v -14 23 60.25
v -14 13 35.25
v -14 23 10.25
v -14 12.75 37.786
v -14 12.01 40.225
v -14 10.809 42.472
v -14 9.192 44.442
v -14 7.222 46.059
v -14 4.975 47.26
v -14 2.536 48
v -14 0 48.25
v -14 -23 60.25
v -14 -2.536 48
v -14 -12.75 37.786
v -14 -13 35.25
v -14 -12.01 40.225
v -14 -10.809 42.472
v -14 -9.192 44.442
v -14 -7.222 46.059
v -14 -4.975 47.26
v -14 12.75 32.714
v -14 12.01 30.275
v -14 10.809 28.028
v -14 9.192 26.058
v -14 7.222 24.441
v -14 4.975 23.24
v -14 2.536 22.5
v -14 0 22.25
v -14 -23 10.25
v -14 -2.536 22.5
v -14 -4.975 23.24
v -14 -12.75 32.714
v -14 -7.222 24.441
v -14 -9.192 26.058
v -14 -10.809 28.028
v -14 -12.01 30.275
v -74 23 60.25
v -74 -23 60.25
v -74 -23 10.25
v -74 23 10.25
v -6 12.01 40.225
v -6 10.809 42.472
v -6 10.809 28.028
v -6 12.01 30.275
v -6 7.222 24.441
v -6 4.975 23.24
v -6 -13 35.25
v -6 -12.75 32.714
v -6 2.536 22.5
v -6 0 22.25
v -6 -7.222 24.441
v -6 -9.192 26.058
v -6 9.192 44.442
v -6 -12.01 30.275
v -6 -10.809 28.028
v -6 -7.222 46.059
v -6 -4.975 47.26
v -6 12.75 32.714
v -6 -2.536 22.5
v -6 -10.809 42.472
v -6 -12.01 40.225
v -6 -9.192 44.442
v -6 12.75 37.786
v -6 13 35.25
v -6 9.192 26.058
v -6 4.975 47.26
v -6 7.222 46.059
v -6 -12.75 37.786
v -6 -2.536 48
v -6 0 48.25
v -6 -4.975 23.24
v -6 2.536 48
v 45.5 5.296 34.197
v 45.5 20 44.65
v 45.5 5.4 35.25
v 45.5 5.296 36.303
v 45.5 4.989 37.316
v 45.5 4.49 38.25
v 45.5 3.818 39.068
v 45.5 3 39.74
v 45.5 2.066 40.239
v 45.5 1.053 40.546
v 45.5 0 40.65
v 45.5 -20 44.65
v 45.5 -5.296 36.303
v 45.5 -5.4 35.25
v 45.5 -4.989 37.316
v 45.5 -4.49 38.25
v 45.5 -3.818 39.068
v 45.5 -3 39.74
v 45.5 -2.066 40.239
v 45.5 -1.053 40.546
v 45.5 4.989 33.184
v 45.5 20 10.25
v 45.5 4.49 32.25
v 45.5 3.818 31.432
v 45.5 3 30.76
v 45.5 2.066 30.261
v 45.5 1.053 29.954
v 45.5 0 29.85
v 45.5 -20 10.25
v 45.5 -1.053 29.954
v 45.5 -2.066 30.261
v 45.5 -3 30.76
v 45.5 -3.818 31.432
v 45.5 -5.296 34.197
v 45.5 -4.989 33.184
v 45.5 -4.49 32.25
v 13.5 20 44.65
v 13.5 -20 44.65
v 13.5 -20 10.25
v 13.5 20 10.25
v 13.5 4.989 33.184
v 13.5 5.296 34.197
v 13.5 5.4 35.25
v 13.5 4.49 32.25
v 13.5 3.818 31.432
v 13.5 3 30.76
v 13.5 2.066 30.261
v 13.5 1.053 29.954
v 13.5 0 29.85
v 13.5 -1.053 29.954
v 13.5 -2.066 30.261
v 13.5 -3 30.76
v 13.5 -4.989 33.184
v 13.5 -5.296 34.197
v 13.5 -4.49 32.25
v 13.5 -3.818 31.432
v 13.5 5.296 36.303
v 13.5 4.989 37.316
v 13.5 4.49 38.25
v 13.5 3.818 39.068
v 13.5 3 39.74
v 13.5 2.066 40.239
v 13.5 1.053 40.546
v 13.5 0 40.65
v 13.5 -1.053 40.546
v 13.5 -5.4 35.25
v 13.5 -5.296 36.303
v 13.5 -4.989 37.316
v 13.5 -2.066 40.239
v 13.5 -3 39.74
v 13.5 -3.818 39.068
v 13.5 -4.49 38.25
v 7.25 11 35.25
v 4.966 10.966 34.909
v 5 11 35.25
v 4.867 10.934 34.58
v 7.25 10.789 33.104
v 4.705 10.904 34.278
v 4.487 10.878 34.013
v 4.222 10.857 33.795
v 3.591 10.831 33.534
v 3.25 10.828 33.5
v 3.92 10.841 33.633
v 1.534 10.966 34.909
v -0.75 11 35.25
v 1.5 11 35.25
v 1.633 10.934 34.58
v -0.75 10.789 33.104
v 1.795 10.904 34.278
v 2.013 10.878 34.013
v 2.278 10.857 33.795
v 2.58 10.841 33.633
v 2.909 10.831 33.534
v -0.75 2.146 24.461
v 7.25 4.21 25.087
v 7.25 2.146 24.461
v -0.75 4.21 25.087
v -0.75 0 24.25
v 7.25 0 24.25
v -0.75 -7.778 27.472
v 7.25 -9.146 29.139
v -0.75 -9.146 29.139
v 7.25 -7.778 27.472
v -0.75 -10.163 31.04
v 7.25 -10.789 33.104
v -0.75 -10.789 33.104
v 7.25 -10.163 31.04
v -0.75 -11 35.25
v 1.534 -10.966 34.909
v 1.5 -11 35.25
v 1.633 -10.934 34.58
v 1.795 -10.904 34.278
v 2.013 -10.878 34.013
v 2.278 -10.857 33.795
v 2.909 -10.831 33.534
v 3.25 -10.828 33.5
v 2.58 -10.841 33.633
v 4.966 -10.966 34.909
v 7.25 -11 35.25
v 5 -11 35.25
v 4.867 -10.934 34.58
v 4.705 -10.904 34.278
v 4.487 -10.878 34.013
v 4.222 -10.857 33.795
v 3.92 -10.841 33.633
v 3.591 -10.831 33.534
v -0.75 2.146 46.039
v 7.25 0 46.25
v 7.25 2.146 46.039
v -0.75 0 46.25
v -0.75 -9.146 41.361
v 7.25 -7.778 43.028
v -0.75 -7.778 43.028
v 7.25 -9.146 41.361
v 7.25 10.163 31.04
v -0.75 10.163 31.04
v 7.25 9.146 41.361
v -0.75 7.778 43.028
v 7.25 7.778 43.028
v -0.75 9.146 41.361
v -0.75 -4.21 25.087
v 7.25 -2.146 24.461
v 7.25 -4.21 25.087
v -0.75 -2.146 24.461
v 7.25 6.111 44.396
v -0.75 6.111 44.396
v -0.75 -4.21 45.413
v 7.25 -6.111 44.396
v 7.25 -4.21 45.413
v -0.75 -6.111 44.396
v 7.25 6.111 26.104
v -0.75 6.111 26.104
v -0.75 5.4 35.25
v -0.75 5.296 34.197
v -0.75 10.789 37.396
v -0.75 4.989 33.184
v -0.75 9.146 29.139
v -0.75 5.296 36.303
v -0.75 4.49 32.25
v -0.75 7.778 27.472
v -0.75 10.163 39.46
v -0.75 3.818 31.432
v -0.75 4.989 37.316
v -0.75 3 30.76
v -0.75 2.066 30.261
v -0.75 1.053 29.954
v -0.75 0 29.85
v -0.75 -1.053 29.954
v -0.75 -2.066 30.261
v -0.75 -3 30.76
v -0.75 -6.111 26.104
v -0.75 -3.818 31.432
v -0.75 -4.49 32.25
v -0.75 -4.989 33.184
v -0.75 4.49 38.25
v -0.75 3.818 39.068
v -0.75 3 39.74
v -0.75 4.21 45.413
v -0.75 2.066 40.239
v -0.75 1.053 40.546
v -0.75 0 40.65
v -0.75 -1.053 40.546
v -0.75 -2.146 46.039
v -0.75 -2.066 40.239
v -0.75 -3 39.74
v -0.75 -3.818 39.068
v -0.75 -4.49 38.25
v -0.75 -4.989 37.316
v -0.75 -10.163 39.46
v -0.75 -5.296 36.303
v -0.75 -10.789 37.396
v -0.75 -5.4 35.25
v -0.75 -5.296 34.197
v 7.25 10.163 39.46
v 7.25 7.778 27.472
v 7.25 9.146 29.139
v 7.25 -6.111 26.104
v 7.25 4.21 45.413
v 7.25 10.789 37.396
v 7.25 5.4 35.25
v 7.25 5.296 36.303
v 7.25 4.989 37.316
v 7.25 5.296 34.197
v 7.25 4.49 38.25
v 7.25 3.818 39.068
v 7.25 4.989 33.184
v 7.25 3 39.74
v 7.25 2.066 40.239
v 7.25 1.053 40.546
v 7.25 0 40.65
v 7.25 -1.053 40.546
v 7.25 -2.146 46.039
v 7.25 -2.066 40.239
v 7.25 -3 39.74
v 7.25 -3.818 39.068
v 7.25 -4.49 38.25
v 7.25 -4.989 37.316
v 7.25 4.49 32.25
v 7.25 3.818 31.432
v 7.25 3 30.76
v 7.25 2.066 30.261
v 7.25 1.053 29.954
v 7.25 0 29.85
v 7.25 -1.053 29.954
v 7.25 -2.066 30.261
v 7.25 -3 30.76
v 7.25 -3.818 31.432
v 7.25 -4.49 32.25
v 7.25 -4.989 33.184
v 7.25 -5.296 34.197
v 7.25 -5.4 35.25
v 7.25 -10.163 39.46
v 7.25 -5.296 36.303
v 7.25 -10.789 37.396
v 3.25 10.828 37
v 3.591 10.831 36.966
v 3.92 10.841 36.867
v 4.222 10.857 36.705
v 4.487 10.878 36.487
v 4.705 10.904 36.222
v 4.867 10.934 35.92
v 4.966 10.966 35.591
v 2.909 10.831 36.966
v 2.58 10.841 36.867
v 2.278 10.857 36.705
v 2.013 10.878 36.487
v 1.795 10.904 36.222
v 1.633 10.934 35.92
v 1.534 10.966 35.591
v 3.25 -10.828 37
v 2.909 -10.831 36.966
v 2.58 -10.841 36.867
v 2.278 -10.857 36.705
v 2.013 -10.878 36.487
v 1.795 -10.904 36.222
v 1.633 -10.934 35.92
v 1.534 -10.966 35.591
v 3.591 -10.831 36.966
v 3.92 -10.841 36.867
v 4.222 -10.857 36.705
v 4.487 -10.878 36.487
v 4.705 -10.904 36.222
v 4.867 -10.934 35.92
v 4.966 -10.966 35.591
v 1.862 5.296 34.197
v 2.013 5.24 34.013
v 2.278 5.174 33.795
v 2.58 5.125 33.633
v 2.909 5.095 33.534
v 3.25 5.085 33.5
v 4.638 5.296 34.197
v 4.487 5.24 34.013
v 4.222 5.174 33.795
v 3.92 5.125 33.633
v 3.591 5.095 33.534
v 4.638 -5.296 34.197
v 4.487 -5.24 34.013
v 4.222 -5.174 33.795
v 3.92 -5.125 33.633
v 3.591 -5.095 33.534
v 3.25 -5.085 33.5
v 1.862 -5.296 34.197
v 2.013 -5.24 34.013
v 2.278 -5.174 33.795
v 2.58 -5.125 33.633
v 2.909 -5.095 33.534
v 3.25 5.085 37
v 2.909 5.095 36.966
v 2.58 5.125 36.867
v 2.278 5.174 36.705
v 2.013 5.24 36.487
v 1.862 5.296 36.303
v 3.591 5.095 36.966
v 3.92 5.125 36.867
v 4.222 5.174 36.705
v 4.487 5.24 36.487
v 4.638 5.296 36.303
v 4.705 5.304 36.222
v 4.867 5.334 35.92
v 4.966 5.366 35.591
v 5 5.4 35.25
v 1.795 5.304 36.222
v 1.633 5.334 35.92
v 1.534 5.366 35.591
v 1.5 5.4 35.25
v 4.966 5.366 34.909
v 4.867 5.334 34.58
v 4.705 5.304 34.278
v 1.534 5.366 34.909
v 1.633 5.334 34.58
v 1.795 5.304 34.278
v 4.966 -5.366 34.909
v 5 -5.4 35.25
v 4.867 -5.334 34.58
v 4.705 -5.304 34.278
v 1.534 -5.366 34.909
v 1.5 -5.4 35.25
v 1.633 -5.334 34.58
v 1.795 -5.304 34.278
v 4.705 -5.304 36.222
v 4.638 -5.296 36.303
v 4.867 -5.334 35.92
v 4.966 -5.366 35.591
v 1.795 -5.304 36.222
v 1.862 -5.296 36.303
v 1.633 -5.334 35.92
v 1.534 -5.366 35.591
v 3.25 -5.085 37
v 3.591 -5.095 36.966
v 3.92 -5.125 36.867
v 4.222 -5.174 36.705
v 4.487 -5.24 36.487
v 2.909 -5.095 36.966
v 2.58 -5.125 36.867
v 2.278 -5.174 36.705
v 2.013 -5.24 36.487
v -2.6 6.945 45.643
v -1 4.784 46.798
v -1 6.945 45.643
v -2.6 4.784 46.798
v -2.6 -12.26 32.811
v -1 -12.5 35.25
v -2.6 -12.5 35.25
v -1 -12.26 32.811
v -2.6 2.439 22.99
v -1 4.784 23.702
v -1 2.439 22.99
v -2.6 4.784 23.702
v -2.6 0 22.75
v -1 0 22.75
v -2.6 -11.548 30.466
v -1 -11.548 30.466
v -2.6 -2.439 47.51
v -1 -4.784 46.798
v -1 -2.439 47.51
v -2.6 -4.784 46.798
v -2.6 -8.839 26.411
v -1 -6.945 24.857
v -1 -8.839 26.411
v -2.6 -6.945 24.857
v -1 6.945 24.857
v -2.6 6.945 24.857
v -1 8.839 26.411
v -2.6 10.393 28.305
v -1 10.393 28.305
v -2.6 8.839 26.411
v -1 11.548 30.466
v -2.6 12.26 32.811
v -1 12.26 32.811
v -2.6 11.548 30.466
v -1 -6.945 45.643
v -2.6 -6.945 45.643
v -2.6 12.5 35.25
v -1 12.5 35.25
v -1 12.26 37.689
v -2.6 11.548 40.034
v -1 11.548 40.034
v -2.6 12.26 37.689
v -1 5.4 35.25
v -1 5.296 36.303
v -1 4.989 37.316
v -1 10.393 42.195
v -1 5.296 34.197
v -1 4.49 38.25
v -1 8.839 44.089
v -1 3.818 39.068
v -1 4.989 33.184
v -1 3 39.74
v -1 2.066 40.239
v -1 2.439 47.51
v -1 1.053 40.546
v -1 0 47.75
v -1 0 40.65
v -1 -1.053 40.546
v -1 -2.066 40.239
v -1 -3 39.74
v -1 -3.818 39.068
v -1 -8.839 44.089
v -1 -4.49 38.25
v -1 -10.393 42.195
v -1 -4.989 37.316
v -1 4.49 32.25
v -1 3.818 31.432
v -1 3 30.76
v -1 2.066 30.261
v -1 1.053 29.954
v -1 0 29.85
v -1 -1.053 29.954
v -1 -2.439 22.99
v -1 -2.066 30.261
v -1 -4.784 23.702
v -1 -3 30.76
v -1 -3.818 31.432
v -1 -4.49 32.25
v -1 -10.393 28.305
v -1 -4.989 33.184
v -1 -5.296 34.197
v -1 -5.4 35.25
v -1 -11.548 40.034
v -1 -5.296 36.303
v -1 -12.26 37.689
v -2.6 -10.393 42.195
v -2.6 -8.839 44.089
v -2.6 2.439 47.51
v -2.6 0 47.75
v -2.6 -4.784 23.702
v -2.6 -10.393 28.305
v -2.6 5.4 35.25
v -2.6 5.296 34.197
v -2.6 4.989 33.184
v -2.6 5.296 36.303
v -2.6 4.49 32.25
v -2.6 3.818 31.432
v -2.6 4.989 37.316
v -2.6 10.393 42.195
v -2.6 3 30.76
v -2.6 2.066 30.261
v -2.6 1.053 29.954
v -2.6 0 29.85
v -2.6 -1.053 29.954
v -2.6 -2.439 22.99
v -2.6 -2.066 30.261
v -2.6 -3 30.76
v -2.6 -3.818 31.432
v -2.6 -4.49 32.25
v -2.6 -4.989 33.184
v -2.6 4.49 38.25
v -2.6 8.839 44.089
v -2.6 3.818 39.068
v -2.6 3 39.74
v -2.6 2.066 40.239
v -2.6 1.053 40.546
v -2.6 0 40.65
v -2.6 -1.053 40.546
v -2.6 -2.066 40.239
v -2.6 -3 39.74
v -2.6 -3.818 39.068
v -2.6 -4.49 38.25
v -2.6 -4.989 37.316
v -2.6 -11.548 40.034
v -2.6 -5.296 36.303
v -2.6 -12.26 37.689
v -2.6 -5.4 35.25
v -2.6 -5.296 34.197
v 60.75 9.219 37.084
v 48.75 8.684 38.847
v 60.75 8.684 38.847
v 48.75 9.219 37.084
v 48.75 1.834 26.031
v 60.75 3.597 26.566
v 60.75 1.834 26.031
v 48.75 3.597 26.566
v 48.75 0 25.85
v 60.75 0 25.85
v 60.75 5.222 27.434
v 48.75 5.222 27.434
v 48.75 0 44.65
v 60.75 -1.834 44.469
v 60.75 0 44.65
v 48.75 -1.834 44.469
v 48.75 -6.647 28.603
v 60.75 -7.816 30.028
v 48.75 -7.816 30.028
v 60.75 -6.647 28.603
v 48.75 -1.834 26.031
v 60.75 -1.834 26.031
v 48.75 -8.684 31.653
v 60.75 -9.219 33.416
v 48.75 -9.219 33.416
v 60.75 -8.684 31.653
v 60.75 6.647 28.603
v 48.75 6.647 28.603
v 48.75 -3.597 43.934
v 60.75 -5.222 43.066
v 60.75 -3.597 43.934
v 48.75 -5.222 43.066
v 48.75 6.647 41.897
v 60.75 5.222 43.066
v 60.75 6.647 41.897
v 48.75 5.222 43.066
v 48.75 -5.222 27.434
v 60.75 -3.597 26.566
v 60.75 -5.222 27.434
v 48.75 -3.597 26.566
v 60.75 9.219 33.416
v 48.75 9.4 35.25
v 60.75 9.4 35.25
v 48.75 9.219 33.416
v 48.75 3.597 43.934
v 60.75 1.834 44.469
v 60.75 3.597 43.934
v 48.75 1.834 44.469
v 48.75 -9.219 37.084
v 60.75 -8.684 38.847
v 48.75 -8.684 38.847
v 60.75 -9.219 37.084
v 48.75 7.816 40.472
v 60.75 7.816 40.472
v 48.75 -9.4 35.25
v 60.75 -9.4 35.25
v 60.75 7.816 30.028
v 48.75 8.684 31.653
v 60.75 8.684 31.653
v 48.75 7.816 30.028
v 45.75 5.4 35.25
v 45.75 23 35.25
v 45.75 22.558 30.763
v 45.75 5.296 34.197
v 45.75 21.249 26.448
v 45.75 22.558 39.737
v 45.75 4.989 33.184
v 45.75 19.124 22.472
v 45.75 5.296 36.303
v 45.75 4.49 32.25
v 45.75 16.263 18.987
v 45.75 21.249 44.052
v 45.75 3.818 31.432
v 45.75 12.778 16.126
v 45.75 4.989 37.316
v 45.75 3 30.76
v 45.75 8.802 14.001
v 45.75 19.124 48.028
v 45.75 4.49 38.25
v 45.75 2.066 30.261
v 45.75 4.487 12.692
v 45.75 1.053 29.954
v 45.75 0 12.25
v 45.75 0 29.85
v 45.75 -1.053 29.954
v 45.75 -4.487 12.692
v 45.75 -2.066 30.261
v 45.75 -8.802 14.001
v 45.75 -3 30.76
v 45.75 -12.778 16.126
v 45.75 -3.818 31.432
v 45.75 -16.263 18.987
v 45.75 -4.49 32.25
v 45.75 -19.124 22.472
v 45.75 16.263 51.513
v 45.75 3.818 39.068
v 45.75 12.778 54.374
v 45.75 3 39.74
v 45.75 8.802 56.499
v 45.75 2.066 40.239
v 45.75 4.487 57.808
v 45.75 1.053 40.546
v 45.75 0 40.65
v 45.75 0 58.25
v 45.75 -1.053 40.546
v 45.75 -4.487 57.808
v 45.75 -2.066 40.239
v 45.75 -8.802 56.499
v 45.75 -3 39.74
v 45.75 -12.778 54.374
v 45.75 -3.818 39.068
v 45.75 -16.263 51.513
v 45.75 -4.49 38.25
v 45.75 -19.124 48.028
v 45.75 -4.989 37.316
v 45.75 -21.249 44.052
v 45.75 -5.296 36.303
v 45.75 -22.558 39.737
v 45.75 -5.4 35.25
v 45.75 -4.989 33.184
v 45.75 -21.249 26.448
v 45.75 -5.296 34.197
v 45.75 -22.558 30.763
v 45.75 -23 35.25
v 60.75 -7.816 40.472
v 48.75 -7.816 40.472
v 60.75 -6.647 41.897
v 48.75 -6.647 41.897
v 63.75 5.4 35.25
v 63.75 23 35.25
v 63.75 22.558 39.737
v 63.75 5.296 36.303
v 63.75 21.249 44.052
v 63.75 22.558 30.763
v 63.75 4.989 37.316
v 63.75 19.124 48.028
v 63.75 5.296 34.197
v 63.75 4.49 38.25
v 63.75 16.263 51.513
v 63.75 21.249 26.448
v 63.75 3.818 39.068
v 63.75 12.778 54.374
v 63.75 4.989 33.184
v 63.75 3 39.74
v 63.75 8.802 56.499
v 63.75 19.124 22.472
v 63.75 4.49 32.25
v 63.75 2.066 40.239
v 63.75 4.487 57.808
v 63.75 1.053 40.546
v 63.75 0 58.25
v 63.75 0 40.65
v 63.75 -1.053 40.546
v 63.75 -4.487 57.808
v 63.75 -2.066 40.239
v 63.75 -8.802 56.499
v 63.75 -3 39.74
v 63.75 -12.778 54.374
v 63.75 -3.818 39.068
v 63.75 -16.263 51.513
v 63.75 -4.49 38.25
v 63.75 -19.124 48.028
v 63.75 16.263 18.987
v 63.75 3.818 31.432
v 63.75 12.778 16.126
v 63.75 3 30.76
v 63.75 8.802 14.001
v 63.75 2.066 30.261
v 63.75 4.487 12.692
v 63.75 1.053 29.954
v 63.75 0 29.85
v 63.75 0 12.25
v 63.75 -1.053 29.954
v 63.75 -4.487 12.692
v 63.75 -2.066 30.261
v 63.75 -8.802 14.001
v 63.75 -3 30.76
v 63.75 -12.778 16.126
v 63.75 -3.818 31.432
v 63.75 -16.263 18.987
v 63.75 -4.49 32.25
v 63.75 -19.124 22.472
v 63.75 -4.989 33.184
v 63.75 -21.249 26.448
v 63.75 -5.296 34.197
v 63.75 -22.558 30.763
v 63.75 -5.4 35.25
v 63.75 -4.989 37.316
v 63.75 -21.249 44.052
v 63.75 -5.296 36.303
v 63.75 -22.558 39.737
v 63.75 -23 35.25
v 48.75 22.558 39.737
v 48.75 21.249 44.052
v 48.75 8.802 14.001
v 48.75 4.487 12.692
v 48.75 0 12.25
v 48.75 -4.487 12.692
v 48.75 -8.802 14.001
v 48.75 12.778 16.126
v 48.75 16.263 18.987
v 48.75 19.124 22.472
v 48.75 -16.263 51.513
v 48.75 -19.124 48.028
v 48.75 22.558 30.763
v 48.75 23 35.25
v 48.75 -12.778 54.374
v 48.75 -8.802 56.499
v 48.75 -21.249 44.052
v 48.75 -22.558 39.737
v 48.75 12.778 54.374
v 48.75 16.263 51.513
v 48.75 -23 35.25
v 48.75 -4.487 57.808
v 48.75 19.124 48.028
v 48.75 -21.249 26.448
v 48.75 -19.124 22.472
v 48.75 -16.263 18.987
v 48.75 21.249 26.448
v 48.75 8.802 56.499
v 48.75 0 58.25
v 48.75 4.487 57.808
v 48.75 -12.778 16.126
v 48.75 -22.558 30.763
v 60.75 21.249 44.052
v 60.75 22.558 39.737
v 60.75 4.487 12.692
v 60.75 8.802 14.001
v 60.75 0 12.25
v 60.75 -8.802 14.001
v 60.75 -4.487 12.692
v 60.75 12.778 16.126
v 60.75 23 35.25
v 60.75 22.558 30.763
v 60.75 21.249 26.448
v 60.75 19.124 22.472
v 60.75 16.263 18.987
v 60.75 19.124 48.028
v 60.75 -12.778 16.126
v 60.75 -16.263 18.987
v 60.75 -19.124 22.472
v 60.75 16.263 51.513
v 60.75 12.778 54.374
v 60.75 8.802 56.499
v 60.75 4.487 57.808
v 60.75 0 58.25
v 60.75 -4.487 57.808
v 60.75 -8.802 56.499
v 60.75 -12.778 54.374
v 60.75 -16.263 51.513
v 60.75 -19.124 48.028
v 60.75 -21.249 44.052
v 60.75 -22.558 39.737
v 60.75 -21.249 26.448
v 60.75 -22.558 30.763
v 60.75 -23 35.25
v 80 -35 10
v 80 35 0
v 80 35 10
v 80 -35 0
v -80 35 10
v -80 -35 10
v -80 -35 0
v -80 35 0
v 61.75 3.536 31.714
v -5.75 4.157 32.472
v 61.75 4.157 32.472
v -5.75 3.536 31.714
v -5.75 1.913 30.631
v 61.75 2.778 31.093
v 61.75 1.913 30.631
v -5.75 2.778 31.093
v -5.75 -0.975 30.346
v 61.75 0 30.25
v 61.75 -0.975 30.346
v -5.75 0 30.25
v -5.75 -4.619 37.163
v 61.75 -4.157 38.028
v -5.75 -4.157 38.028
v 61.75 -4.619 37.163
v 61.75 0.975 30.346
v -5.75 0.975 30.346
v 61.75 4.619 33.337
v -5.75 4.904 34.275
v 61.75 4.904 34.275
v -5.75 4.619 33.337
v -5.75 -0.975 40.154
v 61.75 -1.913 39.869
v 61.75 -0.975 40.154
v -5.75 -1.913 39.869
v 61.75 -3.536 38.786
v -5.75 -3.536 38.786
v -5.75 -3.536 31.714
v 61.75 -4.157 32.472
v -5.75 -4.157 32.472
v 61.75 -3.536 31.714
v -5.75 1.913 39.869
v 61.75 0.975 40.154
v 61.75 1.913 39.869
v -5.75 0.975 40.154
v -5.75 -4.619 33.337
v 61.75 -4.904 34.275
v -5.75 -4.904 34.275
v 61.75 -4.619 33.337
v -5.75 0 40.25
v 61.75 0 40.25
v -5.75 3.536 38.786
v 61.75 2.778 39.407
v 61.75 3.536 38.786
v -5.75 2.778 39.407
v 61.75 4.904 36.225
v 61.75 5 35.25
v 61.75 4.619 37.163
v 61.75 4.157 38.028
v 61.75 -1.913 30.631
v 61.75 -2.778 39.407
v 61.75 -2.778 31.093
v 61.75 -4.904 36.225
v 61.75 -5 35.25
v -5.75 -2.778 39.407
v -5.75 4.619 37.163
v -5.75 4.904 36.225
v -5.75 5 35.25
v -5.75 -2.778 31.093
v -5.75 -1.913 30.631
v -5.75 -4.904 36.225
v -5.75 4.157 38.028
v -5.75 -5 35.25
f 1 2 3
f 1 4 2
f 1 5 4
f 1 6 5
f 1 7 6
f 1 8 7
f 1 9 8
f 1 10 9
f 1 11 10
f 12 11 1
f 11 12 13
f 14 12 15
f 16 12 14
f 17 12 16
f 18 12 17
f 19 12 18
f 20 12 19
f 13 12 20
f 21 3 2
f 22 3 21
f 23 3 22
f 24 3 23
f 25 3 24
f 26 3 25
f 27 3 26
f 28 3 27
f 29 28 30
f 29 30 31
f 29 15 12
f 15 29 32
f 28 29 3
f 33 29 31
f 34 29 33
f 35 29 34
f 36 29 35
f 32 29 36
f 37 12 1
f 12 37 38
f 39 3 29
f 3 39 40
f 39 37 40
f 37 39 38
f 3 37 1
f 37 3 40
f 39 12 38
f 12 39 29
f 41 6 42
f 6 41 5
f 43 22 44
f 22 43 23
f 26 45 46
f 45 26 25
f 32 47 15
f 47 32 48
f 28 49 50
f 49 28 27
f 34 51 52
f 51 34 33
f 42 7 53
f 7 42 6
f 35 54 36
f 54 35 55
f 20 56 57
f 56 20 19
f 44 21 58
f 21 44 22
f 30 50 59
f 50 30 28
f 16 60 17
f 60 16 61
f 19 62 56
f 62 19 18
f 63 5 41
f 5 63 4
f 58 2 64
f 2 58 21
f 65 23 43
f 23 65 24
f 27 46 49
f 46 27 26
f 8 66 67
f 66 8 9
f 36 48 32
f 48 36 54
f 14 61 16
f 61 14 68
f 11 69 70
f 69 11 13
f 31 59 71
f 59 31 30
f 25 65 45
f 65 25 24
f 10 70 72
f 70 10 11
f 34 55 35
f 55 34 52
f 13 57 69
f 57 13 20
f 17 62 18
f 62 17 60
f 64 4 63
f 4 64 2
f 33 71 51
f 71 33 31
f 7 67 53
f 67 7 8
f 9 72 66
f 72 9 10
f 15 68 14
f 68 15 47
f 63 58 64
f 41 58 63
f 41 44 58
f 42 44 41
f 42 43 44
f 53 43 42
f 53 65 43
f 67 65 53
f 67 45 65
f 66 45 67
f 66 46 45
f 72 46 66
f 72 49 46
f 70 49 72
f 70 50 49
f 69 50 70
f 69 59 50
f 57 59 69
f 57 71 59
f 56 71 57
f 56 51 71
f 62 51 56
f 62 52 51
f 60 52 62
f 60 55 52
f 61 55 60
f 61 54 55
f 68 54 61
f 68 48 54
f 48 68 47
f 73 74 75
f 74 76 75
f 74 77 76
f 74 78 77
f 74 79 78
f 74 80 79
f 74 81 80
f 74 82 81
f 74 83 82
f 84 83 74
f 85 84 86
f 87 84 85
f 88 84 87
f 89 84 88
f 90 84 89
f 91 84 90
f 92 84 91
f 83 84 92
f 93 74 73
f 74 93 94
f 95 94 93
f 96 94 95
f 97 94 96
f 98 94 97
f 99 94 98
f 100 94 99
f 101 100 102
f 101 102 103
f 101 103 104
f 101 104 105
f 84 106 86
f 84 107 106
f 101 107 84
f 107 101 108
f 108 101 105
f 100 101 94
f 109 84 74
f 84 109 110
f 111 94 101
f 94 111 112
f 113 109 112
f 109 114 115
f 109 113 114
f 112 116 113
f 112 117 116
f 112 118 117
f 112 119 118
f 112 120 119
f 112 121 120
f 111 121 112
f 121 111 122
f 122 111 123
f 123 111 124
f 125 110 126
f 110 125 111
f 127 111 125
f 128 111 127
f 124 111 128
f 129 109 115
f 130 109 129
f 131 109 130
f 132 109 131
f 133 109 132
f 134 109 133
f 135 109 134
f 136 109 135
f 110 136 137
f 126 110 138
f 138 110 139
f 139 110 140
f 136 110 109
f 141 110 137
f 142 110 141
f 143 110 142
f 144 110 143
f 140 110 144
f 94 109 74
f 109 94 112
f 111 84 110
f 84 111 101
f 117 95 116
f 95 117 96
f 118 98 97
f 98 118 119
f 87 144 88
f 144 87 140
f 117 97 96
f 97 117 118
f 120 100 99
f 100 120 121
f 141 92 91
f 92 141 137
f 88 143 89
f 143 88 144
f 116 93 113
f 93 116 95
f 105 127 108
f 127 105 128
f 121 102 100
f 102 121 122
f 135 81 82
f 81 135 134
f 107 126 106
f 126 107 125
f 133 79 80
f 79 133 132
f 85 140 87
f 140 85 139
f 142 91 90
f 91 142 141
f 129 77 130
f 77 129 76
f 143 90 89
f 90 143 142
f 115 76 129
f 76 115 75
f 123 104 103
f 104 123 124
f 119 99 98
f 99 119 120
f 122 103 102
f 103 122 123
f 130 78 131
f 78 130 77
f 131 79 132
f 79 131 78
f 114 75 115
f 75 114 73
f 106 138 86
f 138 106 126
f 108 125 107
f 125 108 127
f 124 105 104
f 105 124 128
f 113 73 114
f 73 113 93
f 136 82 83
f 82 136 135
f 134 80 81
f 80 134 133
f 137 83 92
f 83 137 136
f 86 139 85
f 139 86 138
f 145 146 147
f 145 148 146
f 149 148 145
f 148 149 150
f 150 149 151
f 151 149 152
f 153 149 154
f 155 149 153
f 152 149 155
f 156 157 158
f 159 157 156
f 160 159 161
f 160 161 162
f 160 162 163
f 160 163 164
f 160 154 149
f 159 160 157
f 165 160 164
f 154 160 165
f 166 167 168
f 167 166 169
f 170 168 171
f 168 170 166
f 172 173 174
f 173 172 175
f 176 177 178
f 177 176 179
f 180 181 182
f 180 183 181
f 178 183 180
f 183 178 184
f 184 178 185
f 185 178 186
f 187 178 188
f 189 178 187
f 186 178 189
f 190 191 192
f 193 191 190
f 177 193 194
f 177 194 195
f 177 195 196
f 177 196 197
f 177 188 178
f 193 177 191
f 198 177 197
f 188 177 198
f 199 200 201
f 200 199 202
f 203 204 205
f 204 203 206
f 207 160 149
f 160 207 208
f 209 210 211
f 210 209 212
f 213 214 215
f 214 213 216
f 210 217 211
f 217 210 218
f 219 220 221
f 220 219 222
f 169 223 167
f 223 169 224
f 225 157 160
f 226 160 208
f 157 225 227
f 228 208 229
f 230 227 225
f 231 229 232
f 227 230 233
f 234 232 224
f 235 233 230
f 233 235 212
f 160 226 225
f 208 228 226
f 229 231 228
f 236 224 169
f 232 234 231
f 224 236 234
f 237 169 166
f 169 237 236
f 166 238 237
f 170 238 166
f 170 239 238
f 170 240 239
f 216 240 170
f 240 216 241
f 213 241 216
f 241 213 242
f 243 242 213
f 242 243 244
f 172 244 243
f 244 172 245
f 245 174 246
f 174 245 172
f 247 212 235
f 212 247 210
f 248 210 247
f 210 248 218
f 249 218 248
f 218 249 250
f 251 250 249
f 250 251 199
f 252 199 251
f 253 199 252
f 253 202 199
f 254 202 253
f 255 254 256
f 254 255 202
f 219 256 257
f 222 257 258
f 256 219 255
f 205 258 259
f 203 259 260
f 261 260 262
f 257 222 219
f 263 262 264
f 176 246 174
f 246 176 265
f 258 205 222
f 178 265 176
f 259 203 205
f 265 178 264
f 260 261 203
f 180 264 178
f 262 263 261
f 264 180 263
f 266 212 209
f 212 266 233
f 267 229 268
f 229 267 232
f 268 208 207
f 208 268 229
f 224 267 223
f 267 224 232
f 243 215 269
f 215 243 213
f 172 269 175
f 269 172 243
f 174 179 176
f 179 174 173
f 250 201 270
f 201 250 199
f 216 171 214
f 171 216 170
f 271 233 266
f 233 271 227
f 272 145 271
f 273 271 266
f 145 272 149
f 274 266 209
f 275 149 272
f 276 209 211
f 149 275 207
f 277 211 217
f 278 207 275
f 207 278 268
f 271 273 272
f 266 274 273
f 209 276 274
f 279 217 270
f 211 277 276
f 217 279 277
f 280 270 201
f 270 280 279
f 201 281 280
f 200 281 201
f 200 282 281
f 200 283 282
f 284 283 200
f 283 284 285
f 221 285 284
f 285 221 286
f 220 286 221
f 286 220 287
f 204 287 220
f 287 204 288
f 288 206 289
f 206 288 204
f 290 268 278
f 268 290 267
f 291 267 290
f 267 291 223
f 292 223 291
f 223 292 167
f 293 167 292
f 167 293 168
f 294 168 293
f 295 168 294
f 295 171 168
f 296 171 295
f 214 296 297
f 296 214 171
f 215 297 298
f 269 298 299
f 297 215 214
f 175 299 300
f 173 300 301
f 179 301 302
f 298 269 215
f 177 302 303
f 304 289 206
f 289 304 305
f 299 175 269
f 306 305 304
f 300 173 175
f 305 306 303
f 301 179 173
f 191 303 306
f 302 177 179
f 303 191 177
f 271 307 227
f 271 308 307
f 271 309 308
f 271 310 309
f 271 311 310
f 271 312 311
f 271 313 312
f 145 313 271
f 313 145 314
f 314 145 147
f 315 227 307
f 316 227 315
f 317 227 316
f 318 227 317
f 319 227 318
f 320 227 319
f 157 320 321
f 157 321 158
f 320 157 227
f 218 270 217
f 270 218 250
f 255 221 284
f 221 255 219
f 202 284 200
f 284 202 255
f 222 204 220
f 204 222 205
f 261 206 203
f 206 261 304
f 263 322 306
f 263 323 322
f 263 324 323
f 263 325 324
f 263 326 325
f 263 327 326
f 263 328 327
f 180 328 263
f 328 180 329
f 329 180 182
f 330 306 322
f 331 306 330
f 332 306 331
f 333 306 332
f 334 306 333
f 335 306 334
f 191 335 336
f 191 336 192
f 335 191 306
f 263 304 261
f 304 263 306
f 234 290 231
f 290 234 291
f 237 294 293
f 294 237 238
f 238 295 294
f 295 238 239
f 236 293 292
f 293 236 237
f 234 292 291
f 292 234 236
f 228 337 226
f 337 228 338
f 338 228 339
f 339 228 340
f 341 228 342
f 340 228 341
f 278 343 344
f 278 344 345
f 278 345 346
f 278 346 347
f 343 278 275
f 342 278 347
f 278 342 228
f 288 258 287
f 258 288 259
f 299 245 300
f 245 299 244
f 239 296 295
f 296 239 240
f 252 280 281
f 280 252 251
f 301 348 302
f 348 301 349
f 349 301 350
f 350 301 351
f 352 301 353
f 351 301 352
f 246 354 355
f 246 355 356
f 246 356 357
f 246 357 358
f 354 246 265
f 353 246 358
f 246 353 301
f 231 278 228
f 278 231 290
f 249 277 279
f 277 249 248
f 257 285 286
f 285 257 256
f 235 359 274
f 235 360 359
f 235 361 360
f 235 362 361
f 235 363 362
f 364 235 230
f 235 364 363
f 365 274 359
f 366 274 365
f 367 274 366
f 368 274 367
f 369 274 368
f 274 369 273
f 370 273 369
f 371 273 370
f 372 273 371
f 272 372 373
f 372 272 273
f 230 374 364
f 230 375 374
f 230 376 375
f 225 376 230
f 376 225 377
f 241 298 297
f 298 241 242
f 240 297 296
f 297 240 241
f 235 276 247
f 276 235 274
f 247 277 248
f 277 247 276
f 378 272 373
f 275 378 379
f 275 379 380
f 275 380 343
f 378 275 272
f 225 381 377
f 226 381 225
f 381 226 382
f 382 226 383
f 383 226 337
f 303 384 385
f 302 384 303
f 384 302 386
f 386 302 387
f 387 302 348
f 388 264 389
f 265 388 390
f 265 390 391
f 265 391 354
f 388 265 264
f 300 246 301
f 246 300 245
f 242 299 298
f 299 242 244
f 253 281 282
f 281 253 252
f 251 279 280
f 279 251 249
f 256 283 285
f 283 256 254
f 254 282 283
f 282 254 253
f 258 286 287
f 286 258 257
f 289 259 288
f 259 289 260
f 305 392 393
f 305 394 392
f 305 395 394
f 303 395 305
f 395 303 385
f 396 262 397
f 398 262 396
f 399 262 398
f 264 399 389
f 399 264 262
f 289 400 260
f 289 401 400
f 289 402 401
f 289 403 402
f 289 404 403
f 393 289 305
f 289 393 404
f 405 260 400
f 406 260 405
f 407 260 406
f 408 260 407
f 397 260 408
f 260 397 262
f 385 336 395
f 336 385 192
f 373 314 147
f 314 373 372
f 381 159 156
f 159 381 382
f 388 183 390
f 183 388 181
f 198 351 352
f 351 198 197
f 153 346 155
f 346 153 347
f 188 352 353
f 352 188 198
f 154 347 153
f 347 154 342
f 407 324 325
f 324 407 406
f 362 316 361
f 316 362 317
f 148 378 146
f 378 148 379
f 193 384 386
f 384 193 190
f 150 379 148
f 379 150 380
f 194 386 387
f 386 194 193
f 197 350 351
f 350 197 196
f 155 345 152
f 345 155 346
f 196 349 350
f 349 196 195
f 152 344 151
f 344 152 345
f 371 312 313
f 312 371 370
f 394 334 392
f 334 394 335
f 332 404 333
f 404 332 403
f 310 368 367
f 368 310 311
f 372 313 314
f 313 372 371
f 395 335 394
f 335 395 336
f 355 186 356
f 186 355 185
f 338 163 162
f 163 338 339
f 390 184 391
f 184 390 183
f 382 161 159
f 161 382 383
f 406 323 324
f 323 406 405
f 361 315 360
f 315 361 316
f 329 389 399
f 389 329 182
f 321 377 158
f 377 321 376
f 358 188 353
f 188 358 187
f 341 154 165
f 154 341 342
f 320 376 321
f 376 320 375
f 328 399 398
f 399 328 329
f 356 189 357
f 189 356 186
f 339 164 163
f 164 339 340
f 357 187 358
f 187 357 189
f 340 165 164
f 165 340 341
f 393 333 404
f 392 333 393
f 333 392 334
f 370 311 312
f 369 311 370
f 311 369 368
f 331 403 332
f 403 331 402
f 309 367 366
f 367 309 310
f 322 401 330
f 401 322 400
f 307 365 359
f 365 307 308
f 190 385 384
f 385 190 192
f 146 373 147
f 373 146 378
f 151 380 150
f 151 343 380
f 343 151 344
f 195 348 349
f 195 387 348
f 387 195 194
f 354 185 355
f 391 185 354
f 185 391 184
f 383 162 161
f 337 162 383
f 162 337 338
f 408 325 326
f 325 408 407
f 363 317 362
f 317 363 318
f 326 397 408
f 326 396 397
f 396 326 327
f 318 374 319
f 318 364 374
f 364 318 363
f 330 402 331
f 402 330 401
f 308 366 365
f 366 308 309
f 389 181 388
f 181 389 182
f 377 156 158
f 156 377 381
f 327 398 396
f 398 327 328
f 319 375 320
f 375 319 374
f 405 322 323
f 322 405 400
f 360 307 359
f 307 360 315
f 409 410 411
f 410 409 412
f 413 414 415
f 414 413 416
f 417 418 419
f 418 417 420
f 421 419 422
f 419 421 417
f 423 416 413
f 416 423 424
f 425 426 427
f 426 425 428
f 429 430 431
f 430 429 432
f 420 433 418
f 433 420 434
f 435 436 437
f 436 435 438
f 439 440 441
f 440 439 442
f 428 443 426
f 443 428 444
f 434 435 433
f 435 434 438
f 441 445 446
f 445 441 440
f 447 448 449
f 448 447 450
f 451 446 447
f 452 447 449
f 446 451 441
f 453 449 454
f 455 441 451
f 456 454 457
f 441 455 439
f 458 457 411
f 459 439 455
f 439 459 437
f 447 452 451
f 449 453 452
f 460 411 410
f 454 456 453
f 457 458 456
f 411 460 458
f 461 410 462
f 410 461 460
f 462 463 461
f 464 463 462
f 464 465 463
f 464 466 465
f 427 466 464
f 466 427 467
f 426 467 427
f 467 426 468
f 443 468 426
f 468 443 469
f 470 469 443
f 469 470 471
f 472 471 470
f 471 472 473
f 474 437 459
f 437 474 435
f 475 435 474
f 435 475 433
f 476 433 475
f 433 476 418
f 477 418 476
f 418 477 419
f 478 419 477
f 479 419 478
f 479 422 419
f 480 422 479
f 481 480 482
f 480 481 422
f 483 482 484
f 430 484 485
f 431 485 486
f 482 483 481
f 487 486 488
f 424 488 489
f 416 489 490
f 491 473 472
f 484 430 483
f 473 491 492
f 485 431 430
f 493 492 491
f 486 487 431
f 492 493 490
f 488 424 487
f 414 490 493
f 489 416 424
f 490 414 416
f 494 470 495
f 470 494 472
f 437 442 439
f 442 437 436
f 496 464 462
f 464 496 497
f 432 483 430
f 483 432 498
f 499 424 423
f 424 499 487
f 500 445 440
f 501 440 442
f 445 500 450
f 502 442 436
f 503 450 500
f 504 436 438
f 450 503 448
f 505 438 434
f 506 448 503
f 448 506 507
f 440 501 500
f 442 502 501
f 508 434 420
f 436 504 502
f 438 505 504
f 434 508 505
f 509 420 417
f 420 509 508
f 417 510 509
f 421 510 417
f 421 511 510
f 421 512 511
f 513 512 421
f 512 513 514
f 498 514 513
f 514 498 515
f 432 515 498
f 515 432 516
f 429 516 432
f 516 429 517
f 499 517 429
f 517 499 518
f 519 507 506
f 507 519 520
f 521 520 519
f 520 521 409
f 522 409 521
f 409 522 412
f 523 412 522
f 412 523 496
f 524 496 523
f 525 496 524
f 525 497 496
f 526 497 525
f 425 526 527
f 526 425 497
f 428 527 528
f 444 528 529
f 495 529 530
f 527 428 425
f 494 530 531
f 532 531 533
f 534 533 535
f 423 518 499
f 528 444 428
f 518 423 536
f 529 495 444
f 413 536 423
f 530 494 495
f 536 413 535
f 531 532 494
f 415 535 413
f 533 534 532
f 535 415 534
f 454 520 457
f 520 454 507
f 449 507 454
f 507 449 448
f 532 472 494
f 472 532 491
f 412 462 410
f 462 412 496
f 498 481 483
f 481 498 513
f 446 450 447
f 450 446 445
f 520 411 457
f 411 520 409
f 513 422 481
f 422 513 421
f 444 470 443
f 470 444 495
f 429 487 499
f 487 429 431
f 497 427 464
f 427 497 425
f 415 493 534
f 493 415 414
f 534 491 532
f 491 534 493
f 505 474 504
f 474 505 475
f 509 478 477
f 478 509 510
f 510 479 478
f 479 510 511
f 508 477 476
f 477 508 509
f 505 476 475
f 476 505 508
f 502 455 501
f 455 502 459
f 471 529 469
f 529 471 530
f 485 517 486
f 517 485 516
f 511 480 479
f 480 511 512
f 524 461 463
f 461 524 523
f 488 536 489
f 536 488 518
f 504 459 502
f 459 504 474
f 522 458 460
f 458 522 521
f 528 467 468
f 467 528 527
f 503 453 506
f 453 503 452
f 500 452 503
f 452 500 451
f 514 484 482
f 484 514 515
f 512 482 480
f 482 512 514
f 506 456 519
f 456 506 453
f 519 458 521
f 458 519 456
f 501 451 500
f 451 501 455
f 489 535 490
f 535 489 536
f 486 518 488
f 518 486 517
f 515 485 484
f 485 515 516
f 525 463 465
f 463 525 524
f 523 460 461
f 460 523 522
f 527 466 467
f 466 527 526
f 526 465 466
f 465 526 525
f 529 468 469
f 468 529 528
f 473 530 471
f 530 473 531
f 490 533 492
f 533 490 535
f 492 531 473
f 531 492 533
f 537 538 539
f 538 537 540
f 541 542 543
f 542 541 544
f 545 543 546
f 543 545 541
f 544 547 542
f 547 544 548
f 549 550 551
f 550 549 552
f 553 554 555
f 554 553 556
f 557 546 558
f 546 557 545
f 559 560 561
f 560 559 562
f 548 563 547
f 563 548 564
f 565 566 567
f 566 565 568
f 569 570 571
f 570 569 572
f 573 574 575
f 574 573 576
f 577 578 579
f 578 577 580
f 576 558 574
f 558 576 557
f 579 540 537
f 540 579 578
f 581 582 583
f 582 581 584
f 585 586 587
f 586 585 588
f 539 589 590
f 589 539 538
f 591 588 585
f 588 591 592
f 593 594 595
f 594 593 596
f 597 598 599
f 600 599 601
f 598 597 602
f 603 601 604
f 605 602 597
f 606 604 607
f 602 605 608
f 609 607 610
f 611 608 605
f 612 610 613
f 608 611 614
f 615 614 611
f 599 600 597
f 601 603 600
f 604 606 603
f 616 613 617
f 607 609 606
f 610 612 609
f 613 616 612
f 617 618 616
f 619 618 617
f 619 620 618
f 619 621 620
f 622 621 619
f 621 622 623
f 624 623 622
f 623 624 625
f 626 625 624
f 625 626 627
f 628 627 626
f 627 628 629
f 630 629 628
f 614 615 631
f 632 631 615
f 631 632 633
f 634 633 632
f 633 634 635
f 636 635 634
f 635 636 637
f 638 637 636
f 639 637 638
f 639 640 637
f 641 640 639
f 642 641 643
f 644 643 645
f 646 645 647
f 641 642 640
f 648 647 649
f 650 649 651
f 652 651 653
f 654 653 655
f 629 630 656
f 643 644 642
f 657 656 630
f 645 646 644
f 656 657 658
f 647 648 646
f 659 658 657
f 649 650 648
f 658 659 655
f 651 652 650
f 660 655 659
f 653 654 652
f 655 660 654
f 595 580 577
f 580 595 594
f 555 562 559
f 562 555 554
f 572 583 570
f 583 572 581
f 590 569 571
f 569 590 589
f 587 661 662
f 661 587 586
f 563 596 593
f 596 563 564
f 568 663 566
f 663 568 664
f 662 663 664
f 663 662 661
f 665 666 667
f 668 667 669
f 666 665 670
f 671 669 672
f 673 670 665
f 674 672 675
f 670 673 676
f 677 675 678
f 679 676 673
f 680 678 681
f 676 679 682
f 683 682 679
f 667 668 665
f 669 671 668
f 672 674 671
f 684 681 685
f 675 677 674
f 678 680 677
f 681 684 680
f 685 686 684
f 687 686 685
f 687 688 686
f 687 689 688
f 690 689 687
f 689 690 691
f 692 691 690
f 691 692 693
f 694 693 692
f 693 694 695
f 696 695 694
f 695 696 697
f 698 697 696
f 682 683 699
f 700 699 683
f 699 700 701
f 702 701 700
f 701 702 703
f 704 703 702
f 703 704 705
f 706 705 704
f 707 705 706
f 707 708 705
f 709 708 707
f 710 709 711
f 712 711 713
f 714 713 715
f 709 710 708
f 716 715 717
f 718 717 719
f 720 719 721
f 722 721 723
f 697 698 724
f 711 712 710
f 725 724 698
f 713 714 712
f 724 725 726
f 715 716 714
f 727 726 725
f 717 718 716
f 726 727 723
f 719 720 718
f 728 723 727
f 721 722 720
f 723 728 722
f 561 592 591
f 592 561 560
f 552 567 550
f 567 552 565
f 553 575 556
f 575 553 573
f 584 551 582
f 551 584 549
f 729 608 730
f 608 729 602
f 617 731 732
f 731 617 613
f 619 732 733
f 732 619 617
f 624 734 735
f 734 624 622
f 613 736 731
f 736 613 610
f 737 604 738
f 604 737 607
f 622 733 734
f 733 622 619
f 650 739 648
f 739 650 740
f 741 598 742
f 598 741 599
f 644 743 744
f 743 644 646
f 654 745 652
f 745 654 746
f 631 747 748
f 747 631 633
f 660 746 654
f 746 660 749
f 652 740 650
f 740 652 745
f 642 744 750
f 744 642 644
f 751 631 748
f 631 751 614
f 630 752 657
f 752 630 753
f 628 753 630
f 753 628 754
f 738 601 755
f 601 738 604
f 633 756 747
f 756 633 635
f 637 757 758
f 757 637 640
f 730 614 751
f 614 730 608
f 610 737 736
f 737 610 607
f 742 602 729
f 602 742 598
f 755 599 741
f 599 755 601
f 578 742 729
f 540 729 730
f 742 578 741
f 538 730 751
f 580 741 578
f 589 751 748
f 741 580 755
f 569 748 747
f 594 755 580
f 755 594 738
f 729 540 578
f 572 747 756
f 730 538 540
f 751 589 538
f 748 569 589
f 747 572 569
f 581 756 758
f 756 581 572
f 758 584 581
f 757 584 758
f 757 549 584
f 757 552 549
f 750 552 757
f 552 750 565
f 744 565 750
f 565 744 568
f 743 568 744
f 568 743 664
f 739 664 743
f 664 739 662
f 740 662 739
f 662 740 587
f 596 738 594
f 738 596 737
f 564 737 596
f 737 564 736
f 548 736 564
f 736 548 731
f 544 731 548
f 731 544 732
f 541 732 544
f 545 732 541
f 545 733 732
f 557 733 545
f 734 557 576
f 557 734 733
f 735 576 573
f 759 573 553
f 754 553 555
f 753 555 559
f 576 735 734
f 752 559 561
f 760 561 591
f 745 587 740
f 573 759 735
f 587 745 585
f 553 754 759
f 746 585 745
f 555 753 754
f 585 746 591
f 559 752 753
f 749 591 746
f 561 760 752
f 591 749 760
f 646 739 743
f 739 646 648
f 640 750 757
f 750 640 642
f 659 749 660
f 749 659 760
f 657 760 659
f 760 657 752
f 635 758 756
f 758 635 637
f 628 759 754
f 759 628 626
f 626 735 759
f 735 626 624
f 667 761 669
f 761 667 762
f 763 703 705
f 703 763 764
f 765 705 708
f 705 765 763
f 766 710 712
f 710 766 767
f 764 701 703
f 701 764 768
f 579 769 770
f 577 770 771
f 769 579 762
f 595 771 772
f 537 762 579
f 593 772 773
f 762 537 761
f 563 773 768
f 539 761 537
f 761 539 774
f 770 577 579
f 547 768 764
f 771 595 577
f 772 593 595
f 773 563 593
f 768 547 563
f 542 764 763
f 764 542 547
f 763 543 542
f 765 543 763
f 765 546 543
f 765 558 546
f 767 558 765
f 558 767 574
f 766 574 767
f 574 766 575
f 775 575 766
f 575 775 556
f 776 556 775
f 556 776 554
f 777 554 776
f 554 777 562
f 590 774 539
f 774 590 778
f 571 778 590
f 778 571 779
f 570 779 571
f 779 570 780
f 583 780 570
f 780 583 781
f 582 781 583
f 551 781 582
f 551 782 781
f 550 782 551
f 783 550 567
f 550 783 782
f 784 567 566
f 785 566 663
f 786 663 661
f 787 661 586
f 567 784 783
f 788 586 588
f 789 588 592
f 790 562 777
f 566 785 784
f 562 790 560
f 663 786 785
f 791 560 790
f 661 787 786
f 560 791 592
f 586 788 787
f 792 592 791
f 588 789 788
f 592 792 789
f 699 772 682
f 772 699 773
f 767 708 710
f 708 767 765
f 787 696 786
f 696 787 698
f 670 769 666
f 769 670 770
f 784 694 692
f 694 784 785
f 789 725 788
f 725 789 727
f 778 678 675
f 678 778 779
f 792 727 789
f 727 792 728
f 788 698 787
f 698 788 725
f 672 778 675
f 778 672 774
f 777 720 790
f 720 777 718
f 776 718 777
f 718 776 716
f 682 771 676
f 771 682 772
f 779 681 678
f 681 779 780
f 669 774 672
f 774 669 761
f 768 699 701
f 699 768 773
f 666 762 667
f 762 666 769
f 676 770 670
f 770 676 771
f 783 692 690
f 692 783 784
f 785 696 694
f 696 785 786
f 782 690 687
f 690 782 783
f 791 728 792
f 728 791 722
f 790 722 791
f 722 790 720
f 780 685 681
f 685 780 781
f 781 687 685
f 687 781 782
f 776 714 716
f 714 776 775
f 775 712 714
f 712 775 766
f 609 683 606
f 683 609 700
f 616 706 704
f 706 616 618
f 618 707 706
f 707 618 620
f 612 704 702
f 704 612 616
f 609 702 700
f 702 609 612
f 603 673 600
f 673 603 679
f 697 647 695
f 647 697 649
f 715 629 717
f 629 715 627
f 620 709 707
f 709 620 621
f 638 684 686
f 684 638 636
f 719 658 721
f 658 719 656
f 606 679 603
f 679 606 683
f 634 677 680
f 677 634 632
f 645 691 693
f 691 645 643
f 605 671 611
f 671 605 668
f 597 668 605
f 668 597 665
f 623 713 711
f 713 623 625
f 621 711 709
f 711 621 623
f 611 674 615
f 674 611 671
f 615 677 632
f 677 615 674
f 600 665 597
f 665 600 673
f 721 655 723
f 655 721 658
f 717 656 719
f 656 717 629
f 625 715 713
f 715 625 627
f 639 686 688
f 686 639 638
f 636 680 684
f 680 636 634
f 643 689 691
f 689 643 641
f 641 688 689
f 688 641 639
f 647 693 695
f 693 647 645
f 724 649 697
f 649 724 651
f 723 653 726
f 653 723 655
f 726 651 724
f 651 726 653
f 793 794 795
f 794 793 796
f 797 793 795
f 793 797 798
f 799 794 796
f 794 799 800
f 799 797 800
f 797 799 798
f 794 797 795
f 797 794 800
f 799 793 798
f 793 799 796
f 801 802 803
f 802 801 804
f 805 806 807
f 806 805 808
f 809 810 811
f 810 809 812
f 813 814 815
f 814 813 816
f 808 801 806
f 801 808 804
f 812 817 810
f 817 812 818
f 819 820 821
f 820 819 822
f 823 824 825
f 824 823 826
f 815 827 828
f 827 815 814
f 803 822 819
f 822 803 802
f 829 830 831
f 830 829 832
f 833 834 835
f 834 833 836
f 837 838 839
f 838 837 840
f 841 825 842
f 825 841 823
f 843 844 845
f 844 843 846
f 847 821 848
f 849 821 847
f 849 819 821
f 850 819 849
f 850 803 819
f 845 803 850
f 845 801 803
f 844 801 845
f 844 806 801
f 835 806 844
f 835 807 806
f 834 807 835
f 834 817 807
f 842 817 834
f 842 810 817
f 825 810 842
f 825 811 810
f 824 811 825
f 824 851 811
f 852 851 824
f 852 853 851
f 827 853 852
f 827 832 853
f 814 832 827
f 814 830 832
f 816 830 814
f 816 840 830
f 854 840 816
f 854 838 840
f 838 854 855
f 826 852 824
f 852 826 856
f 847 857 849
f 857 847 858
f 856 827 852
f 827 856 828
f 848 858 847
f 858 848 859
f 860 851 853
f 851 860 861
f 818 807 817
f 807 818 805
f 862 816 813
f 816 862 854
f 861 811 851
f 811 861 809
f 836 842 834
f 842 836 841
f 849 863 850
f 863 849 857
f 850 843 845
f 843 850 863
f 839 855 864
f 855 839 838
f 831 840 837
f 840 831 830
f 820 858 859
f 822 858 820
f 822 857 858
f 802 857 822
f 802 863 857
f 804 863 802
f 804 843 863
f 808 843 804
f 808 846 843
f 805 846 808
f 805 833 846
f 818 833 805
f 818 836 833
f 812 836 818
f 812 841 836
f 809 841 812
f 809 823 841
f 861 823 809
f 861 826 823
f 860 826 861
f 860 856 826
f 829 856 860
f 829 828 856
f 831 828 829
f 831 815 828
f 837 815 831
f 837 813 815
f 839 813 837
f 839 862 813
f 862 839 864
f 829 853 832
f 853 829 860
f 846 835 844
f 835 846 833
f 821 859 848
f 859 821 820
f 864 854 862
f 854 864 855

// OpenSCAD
$fn = 32;

// ------------------------------------------------------------------------
// Motor drive station: motor 60 x 50 mm, shaft d10, pulley d46
// Every part is its own module, assembly() places every instance.
// ------------------------------------------------------------------------

// --- part 1 ---
module station_bed() {
  difference() {
    translate([-80, -35, 0]) cube([160, 70, 10]);
  }
}

// --- part 2 ---
module drive_motor() {
  union() {
    translate([-30, -23, 0]) cube([60, 46, 50]);
    translate([34, 0, 25]) rotate([0, 90, 0]) cylinder(h = 8, d = 26, center = true);
  }
}

// --- part 3 ---
module pillow_block() {
  difference() {
    translate([-16, -20, 0]) cube([32, 40, 34.4]);
    translate([0, 0, 25]) rotate([0, 90, 0]) cylinder(h = 34, d = 10.8, center = true);
  }
}

// --- part 4 ---
module drive_shaft() {
  translate([0, 0, -33.75]) cylinder(h = 67.5, d = 10);
}

// --- part 5 ---
module shaft_collar() {
  difference() {
    cylinder(h = 8, d = 22);
    translate([0, 0, -1]) cylinder(h = 10, d = 10.8);
    translate([0, 0, 4]) rotate([90, 0, 0]) cylinder(h = 24, d = 3.5, center = true);
  }
}

// --- part 6 ---
module collar_washer() {
  difference() {
      translate([0, 0, 0]) cylinder(h = 1.6, d = 25);
      translate([0, 0, -1]) cylinder(h = 3.6, d = 10.8);
    }
}

// --- part 7 ---
module drive_pulley() {
  difference() {
    union() {
      cylinder(h = 18, d = 18.8);
      cylinder(h = 3, d = 46);
      translate([0, 0, 15]) cylinder(h = 3, d = 46);
    }
    translate([0, 0, -1]) cylinder(h = 20, d = 10.8);
  }
}

// --- assembly ---
module assembly() {
  color([0.80, 0.24, 0.20]) translate([0, 0, 0]) rotate([0, 0, 0]) station_bed();
  color([0.20, 0.45, 0.75]) translate([-44, 0, 10.25]) rotate([0, 0, 0]) drive_motor();
  color([0.25, 0.62, 0.32]) translate([29.5, 0, 10.25]) rotate([0, 0, 0]) pillow_block();
  color([0.92, 0.70, 0.18]) translate([28, 0, 35.25]) rotate([0, 90, 0]) drive_shaft();
  color([0.58, 0.35, 0.70]) translate([-0.75, 0, 35.25]) rotate([0, 90, 0]) shaft_collar();
  color([0.16, 0.66, 0.66]) translate([-2.6, 0, 35.25]) rotate([0, 90, 0]) collar_washer();
  color([0.85, 0.48, 0.18]) translate([45.75, 0, 35.25]) rotate([0, 90, 0]) drive_pulley();
}

assembly();
